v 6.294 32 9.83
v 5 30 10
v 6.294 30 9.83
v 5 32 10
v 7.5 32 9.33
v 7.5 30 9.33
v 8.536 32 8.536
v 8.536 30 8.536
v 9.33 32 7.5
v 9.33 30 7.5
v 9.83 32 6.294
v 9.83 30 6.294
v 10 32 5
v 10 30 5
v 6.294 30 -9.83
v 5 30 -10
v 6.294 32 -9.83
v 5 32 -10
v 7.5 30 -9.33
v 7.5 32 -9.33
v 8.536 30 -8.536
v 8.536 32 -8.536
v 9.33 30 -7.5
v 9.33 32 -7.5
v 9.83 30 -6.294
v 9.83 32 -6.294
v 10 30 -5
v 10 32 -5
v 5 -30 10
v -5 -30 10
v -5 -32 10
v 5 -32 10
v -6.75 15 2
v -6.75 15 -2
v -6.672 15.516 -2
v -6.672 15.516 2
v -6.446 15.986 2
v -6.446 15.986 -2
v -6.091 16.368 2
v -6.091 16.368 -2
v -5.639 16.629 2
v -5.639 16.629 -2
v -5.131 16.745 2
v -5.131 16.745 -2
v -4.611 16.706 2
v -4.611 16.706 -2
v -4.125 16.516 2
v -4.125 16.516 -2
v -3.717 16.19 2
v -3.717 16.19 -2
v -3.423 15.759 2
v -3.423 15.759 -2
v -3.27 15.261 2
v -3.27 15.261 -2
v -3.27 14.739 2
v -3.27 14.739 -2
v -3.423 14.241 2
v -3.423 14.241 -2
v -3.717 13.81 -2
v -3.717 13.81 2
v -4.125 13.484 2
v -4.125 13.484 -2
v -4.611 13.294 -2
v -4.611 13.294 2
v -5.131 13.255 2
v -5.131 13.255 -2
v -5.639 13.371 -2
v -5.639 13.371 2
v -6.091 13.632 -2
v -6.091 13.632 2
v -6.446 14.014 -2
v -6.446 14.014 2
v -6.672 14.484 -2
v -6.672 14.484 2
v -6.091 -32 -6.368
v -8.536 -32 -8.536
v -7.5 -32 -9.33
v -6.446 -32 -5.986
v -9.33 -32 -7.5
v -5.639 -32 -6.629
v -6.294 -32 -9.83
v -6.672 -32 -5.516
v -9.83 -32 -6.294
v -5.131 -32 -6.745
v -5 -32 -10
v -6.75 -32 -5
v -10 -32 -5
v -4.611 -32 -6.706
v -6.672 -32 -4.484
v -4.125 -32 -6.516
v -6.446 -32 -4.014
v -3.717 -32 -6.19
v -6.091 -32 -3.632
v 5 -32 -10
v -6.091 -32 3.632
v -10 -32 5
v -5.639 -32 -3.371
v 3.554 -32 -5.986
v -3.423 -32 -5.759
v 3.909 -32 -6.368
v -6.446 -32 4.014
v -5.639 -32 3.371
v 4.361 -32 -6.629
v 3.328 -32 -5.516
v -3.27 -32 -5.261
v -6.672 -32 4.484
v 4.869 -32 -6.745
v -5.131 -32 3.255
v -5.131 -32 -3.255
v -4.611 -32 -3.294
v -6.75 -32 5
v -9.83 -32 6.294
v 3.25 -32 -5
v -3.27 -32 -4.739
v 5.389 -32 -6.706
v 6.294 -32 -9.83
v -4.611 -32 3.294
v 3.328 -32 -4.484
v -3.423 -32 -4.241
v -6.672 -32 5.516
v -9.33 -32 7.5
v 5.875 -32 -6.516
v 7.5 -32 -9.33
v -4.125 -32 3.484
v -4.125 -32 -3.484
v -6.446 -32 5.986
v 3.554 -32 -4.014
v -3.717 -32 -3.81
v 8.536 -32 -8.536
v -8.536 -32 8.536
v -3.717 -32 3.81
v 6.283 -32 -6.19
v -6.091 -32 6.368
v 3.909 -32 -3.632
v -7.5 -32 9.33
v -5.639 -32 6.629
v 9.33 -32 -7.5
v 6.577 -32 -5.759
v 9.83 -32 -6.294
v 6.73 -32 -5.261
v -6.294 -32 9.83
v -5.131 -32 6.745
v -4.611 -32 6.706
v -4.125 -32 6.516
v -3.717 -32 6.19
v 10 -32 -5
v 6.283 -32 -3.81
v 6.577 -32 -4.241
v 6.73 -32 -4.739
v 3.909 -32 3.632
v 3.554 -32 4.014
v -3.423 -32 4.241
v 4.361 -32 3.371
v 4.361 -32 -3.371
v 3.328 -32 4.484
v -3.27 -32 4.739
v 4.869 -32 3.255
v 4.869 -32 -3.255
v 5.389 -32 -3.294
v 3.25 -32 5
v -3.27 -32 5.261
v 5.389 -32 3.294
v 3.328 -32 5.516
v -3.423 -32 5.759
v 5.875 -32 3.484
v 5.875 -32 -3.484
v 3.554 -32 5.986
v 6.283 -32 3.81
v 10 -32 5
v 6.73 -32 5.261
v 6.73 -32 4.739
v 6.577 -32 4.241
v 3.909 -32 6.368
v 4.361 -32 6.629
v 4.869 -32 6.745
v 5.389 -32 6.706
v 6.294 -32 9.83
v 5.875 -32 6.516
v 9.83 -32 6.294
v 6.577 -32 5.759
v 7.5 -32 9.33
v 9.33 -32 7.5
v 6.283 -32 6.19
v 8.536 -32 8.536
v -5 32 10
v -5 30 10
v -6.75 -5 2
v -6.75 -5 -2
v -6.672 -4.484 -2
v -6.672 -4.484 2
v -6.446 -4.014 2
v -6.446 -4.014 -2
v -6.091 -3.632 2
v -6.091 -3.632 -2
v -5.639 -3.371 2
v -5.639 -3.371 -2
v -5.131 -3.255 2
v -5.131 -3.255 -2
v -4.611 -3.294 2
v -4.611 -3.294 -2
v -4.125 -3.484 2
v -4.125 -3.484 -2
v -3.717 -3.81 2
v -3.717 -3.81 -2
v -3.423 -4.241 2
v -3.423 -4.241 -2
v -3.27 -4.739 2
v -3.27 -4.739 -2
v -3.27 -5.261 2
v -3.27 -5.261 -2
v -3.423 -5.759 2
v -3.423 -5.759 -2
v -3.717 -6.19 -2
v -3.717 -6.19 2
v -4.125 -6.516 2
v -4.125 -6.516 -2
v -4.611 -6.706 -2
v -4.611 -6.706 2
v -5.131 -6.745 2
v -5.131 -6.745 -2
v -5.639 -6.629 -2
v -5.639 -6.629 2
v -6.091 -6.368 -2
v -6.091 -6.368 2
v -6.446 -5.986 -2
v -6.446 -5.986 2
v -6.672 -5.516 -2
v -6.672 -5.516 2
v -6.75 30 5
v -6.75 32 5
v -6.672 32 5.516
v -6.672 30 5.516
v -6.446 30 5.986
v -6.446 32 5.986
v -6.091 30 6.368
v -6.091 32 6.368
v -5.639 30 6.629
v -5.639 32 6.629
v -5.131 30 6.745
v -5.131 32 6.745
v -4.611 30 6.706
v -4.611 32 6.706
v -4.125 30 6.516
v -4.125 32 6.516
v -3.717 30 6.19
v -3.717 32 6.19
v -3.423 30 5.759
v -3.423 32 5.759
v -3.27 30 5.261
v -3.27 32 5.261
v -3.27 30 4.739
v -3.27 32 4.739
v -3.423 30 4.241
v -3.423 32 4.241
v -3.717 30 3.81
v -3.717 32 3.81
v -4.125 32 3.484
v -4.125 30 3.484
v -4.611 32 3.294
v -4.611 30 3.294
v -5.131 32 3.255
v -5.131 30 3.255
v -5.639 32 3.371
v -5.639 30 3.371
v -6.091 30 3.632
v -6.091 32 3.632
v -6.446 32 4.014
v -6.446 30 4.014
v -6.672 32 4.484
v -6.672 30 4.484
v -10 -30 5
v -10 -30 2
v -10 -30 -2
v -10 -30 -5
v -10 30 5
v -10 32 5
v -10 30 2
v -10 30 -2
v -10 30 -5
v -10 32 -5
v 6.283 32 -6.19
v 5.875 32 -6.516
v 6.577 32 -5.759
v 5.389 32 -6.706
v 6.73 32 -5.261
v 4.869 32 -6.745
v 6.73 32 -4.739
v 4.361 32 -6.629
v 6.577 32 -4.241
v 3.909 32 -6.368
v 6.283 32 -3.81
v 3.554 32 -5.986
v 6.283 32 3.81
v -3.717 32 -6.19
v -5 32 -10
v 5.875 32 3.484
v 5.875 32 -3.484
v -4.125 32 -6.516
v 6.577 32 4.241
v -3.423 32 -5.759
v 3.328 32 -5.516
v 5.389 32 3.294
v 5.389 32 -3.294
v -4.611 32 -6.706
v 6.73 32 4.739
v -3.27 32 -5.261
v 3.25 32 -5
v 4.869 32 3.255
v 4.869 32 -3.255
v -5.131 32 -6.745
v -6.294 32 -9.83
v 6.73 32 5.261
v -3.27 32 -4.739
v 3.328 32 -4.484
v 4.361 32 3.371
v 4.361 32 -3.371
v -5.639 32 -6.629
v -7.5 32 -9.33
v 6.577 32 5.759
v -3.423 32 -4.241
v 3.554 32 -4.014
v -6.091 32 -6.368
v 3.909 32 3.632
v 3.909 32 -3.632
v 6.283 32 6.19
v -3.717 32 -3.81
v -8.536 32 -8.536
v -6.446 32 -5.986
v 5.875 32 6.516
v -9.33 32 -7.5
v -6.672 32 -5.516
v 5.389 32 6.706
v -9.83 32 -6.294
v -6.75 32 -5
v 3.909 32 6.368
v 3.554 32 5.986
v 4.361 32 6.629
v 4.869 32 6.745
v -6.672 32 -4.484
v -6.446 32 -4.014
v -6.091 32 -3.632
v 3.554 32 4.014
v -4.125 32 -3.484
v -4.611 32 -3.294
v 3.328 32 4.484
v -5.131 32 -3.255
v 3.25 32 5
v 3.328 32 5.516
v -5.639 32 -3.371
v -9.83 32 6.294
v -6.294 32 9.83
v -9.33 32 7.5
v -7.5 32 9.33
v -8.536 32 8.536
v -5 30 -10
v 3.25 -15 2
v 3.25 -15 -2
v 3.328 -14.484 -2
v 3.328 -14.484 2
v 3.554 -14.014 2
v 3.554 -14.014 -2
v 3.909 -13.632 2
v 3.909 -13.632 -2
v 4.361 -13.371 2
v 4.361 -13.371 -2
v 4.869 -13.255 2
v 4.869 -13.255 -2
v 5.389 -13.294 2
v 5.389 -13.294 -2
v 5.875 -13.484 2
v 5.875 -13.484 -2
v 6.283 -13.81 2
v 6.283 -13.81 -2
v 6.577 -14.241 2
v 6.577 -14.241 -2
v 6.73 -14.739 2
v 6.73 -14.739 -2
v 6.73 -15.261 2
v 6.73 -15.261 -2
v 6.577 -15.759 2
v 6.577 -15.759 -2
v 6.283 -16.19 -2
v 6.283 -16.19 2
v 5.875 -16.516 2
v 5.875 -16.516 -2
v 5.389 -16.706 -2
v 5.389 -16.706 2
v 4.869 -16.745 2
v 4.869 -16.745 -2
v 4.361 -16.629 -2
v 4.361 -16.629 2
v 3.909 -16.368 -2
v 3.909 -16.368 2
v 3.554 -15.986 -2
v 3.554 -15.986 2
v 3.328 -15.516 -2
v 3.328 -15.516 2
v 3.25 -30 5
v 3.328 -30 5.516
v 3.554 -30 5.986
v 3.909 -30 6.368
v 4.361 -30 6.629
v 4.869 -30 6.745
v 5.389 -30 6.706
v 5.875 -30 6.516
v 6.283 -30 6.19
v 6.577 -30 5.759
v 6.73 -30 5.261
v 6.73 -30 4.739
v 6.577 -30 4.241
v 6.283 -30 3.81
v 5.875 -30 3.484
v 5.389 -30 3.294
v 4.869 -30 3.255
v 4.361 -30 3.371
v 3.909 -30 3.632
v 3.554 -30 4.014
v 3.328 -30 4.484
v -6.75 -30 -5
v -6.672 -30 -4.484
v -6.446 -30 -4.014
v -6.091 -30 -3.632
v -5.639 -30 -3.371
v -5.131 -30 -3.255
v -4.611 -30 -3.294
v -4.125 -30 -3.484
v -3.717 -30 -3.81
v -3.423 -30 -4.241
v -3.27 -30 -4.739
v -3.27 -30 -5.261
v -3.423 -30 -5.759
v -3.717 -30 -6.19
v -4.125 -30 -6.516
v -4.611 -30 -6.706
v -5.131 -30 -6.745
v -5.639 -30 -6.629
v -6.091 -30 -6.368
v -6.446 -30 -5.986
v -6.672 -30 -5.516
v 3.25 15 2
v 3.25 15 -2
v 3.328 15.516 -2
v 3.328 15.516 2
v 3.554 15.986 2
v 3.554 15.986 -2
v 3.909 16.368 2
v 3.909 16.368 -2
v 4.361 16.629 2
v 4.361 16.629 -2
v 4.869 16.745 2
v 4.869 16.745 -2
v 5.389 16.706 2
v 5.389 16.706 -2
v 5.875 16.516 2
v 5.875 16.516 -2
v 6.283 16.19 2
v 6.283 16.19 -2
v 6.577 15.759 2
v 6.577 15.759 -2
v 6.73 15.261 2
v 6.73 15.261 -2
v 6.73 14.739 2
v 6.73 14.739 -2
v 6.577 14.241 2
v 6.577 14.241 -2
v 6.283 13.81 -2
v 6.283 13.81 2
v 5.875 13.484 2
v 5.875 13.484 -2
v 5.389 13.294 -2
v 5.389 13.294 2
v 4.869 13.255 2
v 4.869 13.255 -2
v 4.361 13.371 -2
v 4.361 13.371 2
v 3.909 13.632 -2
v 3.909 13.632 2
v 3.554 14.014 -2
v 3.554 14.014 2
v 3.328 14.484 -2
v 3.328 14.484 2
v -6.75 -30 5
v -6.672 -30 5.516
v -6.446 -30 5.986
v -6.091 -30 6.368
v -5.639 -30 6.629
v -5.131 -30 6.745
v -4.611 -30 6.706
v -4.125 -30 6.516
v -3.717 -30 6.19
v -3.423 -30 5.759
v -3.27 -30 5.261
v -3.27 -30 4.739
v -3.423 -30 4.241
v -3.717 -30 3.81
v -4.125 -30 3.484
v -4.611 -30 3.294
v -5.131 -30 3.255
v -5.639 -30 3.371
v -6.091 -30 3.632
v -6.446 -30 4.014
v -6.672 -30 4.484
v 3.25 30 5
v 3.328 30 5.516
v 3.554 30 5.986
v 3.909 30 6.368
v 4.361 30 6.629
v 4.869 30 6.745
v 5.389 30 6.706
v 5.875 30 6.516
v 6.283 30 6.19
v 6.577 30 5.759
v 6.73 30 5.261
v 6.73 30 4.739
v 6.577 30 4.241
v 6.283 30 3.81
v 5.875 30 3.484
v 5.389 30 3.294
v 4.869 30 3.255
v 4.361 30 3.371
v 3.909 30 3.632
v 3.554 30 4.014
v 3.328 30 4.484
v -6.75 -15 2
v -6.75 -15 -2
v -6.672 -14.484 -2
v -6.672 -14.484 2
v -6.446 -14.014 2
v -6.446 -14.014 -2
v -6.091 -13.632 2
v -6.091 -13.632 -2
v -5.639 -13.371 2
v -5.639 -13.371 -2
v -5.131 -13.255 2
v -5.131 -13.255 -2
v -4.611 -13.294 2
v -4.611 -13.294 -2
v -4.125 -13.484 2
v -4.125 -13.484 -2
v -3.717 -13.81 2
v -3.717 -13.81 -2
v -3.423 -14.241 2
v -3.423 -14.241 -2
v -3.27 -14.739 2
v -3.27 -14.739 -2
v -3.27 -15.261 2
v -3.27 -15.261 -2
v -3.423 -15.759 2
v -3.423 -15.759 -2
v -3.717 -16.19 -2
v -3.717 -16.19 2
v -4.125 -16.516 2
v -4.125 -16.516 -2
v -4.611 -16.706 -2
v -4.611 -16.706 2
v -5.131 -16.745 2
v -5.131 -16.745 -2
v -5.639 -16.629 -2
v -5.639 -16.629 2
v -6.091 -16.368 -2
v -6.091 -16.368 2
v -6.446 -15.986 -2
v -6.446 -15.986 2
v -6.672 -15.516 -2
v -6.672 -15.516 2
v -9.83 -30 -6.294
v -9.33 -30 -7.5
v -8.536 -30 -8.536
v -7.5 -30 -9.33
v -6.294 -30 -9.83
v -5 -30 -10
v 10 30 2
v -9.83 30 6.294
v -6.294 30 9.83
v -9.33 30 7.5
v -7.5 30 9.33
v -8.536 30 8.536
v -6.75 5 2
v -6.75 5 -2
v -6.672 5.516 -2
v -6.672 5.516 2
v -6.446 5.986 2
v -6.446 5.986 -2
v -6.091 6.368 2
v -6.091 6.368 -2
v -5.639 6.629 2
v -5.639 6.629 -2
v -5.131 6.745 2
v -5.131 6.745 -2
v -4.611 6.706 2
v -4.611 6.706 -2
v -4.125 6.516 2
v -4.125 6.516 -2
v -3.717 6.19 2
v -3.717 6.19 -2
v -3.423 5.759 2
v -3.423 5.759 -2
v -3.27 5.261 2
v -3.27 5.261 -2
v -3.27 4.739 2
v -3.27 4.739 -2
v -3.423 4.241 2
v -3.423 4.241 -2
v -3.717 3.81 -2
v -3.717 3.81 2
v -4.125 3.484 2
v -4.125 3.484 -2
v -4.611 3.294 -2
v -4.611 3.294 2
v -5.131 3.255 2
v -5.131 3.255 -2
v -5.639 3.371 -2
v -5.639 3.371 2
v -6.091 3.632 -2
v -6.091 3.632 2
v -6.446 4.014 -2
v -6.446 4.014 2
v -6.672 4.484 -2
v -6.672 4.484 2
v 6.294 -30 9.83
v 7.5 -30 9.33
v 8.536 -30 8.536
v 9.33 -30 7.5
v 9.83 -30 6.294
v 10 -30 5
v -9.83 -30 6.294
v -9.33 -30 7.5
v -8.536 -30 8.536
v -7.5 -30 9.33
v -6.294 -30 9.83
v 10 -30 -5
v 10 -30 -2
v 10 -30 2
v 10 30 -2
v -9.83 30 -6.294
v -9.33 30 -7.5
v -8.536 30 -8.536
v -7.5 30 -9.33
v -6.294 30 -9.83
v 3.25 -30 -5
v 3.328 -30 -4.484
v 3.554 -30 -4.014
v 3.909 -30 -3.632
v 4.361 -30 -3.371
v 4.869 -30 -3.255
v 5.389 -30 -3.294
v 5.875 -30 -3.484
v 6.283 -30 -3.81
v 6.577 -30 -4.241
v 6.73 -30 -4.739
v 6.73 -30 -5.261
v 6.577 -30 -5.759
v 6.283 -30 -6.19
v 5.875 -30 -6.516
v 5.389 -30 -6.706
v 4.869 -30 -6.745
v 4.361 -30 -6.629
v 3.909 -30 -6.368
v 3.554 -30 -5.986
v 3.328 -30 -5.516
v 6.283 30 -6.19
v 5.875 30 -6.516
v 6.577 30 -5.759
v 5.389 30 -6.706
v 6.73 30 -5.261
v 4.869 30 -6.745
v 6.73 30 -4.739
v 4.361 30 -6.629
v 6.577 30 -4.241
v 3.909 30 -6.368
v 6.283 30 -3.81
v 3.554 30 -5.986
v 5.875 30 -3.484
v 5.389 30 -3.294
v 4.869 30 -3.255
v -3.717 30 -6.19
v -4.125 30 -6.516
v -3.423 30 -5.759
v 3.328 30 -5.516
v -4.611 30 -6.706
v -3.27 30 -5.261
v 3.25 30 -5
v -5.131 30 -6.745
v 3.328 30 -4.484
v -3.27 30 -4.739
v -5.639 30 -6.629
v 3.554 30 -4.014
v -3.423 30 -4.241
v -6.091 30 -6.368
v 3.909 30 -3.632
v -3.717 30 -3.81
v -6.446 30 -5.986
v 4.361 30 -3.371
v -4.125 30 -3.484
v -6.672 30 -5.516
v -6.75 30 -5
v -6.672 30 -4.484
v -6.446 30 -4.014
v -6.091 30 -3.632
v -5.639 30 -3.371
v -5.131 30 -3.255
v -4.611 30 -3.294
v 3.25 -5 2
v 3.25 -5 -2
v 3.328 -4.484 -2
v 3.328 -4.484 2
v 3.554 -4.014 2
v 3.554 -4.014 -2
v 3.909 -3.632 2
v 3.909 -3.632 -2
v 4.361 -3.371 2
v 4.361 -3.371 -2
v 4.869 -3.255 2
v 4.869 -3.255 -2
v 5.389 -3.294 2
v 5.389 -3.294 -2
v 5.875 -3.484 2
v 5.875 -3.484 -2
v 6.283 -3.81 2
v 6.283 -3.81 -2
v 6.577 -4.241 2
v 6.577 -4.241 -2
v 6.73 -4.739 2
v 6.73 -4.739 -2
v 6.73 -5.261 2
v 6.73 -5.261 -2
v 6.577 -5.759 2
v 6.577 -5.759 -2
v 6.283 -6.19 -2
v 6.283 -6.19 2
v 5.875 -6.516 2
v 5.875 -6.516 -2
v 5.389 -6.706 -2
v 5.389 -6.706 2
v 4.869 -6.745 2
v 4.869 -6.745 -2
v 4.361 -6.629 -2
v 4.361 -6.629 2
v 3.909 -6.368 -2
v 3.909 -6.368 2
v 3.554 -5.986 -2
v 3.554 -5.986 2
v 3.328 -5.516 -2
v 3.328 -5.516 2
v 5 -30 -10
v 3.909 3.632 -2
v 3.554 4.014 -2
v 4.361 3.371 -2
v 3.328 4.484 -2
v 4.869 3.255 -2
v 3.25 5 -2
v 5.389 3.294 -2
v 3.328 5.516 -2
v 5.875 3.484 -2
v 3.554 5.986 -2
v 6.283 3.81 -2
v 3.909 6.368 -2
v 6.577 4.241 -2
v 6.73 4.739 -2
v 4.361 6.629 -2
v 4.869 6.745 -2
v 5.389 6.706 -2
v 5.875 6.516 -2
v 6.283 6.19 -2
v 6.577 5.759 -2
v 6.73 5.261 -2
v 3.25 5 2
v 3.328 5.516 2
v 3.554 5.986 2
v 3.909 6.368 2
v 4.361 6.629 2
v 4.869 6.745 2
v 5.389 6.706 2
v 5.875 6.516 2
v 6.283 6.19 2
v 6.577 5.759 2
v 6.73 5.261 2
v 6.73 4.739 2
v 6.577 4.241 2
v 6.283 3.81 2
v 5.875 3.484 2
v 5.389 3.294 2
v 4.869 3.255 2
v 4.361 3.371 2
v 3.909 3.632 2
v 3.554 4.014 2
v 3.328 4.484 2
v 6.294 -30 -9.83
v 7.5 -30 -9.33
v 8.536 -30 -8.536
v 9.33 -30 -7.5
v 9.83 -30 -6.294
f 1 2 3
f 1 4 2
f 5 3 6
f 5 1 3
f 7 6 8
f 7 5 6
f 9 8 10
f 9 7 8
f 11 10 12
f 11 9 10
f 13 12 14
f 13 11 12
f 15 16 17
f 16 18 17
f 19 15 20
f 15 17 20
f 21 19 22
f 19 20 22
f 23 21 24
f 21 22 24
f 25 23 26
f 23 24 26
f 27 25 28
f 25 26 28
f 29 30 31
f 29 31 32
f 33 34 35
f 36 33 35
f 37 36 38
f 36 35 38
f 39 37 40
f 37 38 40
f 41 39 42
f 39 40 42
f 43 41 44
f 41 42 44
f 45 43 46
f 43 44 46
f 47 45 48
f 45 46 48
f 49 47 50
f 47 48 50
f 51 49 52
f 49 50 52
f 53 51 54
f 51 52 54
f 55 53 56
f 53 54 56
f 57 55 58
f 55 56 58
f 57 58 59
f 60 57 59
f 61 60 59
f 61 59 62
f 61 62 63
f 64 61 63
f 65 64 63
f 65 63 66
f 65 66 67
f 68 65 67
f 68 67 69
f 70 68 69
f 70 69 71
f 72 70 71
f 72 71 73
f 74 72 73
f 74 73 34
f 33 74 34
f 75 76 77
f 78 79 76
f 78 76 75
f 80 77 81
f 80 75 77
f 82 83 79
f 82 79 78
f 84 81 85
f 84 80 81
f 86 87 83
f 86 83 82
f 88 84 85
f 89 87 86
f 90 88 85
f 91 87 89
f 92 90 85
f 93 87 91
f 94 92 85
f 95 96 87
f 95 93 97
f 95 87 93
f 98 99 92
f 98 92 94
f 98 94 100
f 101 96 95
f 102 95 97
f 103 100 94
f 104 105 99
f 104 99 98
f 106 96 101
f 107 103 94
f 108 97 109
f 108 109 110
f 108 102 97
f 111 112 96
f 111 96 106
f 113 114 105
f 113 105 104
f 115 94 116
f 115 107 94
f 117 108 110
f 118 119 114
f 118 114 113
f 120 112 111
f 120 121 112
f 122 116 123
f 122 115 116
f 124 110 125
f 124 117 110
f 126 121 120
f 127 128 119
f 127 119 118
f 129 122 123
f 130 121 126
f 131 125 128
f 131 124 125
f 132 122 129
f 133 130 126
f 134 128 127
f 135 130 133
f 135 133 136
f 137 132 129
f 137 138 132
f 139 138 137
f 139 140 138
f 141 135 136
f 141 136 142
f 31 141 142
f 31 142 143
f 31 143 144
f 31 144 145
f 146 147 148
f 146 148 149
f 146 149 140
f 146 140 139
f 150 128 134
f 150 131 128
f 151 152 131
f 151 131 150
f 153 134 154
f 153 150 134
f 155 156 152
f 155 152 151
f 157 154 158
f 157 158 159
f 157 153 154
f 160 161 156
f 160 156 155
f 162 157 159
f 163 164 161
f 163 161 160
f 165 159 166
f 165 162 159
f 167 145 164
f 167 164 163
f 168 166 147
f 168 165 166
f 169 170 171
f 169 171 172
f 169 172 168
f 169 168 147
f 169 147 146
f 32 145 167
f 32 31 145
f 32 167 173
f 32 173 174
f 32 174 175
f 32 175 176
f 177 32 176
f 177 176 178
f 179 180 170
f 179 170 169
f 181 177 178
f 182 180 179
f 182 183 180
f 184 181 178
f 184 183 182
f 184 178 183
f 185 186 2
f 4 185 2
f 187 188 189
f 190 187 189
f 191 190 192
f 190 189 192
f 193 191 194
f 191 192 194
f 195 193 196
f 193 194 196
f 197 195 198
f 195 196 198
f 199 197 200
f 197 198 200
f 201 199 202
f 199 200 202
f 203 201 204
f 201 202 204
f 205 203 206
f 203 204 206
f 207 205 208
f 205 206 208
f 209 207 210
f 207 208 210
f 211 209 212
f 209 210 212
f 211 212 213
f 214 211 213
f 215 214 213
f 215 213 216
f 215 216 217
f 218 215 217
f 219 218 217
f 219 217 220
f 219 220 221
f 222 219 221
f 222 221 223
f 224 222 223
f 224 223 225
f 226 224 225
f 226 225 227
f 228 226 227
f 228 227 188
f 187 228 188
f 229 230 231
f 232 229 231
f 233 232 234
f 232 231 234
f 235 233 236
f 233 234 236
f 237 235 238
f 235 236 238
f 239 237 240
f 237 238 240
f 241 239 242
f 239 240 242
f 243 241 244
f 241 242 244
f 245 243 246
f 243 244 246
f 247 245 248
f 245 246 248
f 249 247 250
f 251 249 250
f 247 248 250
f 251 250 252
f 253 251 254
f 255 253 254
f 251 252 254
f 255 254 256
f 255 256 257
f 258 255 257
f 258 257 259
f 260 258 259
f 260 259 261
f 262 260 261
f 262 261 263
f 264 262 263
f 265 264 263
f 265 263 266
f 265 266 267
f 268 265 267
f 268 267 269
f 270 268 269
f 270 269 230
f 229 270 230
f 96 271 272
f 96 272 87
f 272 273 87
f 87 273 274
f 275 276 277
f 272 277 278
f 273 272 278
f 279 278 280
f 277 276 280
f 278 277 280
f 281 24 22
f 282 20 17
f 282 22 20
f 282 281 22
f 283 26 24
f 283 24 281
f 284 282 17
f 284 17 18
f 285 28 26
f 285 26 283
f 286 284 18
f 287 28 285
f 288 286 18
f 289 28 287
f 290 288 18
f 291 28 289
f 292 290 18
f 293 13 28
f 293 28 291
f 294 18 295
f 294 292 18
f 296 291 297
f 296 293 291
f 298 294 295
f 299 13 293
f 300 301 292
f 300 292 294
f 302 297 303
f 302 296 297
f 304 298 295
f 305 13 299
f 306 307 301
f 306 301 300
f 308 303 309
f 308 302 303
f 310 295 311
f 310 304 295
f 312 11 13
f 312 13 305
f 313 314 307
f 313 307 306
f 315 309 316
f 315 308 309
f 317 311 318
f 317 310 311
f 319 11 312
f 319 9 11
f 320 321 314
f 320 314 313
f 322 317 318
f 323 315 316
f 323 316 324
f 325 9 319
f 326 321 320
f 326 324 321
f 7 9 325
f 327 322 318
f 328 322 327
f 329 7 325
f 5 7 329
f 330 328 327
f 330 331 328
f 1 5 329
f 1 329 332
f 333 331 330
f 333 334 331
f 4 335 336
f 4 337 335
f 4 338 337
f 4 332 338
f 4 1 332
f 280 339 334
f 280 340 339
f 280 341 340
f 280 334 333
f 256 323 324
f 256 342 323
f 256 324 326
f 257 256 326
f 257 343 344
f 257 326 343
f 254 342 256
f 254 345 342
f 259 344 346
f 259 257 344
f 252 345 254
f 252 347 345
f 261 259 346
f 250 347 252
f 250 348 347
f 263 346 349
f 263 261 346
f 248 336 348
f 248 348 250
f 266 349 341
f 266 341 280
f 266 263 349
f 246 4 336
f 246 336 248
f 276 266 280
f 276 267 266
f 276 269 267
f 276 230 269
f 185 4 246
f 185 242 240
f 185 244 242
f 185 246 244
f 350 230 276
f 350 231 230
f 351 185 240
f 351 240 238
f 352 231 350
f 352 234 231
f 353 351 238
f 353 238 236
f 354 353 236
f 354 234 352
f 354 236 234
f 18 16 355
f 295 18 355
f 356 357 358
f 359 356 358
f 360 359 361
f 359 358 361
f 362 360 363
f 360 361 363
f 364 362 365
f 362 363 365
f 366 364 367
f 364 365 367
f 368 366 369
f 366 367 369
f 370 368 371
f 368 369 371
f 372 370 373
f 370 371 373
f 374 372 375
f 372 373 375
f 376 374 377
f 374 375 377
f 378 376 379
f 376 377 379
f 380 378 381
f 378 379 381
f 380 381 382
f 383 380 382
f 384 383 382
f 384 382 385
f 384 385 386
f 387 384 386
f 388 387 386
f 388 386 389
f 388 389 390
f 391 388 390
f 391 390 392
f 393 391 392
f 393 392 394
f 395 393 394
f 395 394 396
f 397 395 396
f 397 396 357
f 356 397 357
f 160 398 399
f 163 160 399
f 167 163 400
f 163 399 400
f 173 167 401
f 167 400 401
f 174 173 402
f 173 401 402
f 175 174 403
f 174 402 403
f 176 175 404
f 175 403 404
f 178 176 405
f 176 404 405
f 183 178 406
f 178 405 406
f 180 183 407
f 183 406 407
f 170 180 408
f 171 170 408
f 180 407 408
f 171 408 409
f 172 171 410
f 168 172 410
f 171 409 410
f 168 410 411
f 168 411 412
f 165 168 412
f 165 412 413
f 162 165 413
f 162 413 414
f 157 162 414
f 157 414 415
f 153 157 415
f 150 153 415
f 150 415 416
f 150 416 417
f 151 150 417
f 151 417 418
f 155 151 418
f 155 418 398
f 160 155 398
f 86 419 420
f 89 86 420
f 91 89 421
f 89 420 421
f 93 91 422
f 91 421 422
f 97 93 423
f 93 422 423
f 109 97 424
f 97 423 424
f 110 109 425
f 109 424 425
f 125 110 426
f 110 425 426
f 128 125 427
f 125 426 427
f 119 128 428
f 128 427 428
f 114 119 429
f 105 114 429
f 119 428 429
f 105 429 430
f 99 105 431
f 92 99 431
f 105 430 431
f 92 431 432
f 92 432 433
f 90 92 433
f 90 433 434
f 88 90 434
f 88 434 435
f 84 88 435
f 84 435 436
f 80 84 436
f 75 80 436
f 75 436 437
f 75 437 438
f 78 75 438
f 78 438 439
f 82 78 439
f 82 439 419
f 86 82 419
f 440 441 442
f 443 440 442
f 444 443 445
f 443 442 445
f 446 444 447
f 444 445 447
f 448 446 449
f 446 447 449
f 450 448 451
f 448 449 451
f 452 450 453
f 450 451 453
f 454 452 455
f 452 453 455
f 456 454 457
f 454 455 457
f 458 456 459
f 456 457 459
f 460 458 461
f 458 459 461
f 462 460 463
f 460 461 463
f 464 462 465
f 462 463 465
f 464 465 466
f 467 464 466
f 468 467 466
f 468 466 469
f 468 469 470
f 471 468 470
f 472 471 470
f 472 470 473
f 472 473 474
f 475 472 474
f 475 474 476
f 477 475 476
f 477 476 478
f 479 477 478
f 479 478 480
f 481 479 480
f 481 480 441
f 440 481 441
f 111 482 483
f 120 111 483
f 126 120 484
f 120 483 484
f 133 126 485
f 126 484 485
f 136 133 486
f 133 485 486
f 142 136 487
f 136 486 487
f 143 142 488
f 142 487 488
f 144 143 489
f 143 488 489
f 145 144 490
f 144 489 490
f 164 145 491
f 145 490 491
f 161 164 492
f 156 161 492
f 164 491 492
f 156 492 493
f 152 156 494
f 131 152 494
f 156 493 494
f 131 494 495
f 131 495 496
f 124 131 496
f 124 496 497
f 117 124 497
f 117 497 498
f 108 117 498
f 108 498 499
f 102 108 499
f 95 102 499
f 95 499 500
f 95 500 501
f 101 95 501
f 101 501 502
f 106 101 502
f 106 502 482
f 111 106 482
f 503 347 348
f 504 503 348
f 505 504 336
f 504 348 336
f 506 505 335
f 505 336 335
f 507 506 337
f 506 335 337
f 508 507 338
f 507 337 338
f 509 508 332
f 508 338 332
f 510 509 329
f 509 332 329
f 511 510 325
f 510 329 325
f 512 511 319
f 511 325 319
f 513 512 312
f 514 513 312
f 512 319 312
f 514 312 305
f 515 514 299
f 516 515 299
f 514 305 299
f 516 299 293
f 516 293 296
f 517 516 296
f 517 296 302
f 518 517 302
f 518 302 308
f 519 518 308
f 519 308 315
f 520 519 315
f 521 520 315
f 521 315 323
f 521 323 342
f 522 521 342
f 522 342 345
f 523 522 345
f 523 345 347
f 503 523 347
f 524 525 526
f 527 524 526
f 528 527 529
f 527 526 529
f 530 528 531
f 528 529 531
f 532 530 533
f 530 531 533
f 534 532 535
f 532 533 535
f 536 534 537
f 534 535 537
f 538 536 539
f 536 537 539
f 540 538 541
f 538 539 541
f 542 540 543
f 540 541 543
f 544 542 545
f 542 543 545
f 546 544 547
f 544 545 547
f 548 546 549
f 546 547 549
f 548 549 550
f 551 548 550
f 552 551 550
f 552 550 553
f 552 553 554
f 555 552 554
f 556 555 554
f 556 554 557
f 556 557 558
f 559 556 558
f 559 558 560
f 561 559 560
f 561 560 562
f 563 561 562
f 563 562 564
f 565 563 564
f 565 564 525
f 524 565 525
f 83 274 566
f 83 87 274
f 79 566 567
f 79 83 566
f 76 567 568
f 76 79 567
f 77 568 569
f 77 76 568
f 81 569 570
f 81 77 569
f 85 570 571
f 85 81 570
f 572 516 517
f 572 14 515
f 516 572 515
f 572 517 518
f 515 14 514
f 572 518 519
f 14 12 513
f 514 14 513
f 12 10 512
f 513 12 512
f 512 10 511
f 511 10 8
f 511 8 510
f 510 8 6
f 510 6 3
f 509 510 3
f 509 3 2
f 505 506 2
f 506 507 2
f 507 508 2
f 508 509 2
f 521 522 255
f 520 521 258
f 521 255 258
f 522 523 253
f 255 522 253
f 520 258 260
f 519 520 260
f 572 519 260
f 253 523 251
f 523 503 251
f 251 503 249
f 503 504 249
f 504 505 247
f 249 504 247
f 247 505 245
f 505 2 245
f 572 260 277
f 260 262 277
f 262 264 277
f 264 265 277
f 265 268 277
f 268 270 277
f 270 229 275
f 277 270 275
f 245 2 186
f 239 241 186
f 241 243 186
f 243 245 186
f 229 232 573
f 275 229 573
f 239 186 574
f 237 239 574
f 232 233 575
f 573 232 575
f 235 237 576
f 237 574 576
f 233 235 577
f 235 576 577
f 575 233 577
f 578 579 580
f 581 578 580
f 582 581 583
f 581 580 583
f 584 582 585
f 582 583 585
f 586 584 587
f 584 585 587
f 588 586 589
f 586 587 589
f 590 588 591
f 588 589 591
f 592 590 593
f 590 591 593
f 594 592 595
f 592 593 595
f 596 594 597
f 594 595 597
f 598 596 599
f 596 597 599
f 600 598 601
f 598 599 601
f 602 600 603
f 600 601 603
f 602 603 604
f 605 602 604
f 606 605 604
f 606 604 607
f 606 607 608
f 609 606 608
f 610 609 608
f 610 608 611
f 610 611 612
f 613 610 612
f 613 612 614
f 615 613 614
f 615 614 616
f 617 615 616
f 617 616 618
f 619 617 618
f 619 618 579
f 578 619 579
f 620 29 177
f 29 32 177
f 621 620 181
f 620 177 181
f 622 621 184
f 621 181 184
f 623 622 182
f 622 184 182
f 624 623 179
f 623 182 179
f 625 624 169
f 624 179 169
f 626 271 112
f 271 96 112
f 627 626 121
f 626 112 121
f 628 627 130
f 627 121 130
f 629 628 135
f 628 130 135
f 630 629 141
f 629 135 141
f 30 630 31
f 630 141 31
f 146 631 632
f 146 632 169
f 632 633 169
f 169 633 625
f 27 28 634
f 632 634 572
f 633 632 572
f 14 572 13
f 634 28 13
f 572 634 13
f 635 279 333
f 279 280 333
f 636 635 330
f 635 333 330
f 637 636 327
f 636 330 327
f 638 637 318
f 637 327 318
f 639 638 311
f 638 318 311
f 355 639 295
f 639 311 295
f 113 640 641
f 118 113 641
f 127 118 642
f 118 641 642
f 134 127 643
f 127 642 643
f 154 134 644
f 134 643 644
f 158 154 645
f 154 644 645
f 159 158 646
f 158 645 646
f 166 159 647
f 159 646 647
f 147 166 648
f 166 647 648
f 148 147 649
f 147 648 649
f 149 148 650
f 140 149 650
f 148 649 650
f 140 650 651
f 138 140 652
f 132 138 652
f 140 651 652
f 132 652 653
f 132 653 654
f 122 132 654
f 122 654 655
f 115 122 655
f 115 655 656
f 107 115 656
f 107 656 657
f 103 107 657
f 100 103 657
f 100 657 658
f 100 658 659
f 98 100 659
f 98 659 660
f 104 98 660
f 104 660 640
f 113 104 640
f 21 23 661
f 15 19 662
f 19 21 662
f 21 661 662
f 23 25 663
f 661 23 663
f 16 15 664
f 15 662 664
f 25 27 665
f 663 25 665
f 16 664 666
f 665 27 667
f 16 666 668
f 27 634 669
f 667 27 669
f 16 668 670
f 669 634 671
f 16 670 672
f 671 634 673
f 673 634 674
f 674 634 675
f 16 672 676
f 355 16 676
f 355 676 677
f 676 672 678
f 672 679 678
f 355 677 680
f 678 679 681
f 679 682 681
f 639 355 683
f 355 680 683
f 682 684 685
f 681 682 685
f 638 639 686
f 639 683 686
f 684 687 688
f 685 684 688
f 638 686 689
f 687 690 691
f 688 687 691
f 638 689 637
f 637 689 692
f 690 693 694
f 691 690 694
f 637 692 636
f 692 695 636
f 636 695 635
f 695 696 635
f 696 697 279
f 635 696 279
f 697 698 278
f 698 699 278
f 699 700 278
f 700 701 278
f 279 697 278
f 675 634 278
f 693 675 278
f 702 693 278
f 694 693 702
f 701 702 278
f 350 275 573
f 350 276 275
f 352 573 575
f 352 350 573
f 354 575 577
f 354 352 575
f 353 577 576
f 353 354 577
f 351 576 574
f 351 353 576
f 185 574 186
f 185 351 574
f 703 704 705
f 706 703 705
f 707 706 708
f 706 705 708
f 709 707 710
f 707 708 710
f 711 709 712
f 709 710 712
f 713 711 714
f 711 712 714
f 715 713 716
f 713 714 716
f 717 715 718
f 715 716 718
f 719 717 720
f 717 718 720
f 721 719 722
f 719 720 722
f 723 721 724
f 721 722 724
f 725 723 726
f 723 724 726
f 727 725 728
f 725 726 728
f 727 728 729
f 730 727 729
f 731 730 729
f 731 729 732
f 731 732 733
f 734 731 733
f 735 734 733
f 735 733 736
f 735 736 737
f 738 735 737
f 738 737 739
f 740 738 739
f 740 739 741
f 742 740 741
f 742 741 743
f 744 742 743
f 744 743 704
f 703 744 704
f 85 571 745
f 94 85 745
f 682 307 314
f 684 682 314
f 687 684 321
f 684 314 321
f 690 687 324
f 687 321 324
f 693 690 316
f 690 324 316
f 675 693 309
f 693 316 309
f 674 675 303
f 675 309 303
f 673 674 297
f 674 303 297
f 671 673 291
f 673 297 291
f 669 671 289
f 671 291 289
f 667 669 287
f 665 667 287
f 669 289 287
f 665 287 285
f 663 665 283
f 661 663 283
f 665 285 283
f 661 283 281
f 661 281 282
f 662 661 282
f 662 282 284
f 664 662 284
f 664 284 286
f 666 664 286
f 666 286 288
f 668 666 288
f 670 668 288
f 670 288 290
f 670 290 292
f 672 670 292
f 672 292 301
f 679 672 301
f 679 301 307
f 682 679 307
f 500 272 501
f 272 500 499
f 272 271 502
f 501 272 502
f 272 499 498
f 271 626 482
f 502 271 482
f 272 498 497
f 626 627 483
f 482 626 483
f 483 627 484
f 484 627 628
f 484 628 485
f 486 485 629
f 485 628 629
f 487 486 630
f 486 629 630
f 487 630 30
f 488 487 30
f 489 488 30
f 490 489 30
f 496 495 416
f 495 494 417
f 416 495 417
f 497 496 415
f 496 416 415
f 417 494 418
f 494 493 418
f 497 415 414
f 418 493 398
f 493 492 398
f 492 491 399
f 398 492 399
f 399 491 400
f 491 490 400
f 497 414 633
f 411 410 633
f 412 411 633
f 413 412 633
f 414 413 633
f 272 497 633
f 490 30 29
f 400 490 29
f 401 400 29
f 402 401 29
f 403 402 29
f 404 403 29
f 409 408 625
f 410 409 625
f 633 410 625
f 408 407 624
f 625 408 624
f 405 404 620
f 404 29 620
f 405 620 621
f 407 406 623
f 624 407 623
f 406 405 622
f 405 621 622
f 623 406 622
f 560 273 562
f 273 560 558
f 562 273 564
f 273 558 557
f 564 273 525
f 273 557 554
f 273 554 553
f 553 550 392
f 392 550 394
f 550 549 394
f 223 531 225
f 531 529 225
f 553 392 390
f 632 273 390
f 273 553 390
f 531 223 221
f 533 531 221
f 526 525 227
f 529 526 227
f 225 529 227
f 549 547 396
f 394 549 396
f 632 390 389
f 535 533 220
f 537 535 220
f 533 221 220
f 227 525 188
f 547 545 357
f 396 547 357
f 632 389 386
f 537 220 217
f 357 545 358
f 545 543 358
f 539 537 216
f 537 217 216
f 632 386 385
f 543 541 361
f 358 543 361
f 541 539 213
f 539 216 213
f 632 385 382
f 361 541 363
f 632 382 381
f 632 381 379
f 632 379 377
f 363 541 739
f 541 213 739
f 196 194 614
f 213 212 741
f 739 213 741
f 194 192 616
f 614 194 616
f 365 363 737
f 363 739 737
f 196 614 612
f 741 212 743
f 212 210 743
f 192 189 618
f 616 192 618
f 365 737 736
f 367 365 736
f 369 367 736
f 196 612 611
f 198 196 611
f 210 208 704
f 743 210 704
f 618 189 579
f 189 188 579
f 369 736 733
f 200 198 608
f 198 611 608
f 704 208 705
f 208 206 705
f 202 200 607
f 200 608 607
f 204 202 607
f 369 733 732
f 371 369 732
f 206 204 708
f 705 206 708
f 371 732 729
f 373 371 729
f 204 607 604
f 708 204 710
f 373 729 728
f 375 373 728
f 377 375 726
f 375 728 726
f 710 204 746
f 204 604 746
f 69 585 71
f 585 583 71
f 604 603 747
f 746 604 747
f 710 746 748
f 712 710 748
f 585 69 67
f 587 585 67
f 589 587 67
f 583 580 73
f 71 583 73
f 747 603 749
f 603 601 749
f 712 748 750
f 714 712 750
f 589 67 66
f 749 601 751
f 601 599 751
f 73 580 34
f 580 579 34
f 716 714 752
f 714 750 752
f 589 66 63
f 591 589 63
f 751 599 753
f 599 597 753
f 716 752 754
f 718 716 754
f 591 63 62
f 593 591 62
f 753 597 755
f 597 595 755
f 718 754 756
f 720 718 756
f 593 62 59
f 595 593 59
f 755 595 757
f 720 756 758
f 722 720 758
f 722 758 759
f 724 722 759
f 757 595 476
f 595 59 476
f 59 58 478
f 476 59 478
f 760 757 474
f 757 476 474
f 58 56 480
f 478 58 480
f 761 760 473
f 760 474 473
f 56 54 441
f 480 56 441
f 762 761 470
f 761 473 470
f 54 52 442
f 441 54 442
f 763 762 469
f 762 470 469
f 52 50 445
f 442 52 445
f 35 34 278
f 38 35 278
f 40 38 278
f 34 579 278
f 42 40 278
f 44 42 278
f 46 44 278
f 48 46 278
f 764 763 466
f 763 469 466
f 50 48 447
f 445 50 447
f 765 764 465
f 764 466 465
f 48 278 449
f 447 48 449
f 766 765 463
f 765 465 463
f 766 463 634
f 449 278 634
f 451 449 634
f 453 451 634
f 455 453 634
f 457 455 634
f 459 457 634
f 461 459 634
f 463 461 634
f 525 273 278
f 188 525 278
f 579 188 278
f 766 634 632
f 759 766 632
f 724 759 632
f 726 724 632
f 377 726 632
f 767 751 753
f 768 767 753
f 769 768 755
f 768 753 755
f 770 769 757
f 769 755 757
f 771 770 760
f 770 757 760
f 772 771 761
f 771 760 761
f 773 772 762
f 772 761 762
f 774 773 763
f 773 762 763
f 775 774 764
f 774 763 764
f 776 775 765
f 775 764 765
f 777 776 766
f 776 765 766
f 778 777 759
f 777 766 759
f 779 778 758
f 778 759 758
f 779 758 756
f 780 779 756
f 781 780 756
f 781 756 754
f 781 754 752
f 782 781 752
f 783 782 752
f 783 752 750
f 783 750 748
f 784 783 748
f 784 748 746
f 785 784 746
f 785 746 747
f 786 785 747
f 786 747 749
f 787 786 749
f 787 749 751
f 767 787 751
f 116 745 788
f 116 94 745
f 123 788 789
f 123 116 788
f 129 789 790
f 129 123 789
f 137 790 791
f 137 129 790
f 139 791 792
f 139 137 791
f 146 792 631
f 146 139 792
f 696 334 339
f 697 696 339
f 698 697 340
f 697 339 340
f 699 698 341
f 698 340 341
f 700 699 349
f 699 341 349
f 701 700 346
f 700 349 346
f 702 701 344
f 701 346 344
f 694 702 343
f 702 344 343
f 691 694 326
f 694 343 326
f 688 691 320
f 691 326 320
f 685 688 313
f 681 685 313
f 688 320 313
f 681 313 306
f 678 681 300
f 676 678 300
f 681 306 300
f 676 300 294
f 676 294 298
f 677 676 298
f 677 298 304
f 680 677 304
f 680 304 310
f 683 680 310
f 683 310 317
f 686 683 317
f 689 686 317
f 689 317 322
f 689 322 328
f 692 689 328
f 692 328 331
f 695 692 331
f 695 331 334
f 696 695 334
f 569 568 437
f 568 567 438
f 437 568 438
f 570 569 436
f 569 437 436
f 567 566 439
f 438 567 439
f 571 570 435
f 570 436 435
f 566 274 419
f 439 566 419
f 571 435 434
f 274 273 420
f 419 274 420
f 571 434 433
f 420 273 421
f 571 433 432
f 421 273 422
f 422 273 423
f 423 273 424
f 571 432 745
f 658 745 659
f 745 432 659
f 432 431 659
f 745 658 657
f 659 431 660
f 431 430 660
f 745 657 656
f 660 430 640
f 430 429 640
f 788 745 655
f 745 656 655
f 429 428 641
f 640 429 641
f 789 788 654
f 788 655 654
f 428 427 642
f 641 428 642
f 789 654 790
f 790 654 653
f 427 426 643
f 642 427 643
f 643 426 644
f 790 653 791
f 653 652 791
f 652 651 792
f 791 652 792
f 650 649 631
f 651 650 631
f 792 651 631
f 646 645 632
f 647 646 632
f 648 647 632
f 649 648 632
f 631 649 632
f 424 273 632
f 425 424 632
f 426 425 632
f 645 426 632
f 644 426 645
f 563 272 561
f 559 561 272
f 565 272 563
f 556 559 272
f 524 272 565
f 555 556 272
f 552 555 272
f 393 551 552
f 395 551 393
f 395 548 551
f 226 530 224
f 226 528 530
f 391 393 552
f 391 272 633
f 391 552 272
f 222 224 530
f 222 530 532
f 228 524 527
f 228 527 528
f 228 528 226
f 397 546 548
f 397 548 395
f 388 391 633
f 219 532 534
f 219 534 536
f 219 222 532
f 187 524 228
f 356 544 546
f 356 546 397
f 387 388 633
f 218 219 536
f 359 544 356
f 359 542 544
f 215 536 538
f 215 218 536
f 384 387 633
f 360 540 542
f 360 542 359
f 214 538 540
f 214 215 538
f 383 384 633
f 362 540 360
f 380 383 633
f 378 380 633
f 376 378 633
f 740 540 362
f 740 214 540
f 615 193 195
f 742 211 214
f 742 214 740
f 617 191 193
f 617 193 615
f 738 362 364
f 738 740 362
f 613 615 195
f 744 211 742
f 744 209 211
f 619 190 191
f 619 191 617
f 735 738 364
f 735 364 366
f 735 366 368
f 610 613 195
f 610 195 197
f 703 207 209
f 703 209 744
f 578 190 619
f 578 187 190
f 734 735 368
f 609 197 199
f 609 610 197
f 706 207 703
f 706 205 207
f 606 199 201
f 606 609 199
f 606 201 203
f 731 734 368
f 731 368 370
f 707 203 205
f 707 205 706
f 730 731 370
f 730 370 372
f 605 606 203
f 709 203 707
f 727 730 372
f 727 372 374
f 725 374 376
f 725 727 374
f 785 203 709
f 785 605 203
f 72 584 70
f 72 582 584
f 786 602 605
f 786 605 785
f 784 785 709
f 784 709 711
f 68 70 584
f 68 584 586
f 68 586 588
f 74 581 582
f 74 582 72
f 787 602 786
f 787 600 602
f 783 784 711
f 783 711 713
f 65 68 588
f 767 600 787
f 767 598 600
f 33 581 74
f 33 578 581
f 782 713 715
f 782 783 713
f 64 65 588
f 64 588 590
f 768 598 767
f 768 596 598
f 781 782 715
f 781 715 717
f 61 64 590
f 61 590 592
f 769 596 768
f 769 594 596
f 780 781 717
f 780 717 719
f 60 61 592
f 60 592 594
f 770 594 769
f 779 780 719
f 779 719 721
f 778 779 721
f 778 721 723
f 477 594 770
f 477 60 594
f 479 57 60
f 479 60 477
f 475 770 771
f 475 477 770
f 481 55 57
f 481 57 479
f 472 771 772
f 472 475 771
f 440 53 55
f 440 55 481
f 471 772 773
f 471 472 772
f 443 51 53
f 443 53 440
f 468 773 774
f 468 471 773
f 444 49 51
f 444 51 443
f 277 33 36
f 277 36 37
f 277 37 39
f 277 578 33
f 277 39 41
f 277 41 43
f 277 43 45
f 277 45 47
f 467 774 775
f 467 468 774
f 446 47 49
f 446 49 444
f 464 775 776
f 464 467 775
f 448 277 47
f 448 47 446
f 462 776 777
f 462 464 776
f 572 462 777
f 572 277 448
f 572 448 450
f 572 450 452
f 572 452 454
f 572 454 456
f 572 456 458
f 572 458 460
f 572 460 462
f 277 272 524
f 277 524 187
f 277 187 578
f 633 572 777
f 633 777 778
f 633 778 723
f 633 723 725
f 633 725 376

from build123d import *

# Parameters (mm, degrees)
F0_W     = 20
F0_H     = 60
F1_DEPTH = 2
F3_DEPTH = 2
F5_D     = 3.5
F6_W     = 20
F6_H     = 8
F6_H_2   = 4
F7_DEPTH = 2
F9_D     = 3.5
F10_R    = 5


# Not quite as in the source:
# - a feature names something its author has since deleted; it is built from what else it names


with BuildPart() as f1:
    # F0 (on Top) → F1 (new body, symmetric)
    with BuildSketch(Plane.XY):
        Rectangle(F0_W, F0_H)
    extrude(amount=F1_DEPTH, both=True)

    # F2 (on face) → F3 (join)
    with BuildSketch(Plane(origin=(0, 30, 0), x_dir=(-1, 0, 0), z_dir=(0, 1, 0))):
        Polygon((10, 2), (-2, 2), (2, -2), (10, -2), align=None)
        Polygon((-2, 2), (-10, 2), (-10, -2), (2, -2), align=None)
        Polygon((10, 10), (-10, 10), (-2, 2), (10, 2), align=None)
        Polygon((2, -2), (-10, -2), (-10, -10), (10, -10), align=None)
        Polygon((10, -2), (2, -2), (10, -10), align=None)
        Polygon((-2, 2), (-10, 10), (-10, 2), align=None)
    extrude(amount=F3_DEPTH)

    # F5 (through all)
    with Locations(Plane.XY.offset(2)):
        with Locations((5, 15), (-5, 15), (-5, 5), (5, 5), (5, -5), (-5, -5), (-5, -15), (5, -15)):
            Hole(F5_D / 2)

    # F6 (on face) → F7 (join)
    with BuildSketch(Plane.XZ.offset(30)):
        with Locations((0, 6)):
            Rectangle(F6_W, F6_H)
        Rectangle(F6_W, F6_H_2)
        with Locations((0, -6)):
            Rectangle(F6_W, F6_H)
    extrude(amount=F7_DEPTH)

    # F9 (through all)
    with Locations(Plane.XZ.offset(32)):
        with Locations((-5, 5), (5, 5), (5, -5), (-5, -5)):
            Hole(F9_D / 2)

    # F10
    f10_edges = [f1.edges().sort_by_distance(p)[0] for p in [
        (10, -31, 10),
        (10, -31, -10),
        (10, 31, 10),
        (10, 31, -10),
        (-10, 31, -10),
        (-10, 31, 10),
        (-10, -31, 10),
        (-10, -31, -10),
    ]]
    fillet(f10_edges, radius=F10_R)


solid = f1.part
